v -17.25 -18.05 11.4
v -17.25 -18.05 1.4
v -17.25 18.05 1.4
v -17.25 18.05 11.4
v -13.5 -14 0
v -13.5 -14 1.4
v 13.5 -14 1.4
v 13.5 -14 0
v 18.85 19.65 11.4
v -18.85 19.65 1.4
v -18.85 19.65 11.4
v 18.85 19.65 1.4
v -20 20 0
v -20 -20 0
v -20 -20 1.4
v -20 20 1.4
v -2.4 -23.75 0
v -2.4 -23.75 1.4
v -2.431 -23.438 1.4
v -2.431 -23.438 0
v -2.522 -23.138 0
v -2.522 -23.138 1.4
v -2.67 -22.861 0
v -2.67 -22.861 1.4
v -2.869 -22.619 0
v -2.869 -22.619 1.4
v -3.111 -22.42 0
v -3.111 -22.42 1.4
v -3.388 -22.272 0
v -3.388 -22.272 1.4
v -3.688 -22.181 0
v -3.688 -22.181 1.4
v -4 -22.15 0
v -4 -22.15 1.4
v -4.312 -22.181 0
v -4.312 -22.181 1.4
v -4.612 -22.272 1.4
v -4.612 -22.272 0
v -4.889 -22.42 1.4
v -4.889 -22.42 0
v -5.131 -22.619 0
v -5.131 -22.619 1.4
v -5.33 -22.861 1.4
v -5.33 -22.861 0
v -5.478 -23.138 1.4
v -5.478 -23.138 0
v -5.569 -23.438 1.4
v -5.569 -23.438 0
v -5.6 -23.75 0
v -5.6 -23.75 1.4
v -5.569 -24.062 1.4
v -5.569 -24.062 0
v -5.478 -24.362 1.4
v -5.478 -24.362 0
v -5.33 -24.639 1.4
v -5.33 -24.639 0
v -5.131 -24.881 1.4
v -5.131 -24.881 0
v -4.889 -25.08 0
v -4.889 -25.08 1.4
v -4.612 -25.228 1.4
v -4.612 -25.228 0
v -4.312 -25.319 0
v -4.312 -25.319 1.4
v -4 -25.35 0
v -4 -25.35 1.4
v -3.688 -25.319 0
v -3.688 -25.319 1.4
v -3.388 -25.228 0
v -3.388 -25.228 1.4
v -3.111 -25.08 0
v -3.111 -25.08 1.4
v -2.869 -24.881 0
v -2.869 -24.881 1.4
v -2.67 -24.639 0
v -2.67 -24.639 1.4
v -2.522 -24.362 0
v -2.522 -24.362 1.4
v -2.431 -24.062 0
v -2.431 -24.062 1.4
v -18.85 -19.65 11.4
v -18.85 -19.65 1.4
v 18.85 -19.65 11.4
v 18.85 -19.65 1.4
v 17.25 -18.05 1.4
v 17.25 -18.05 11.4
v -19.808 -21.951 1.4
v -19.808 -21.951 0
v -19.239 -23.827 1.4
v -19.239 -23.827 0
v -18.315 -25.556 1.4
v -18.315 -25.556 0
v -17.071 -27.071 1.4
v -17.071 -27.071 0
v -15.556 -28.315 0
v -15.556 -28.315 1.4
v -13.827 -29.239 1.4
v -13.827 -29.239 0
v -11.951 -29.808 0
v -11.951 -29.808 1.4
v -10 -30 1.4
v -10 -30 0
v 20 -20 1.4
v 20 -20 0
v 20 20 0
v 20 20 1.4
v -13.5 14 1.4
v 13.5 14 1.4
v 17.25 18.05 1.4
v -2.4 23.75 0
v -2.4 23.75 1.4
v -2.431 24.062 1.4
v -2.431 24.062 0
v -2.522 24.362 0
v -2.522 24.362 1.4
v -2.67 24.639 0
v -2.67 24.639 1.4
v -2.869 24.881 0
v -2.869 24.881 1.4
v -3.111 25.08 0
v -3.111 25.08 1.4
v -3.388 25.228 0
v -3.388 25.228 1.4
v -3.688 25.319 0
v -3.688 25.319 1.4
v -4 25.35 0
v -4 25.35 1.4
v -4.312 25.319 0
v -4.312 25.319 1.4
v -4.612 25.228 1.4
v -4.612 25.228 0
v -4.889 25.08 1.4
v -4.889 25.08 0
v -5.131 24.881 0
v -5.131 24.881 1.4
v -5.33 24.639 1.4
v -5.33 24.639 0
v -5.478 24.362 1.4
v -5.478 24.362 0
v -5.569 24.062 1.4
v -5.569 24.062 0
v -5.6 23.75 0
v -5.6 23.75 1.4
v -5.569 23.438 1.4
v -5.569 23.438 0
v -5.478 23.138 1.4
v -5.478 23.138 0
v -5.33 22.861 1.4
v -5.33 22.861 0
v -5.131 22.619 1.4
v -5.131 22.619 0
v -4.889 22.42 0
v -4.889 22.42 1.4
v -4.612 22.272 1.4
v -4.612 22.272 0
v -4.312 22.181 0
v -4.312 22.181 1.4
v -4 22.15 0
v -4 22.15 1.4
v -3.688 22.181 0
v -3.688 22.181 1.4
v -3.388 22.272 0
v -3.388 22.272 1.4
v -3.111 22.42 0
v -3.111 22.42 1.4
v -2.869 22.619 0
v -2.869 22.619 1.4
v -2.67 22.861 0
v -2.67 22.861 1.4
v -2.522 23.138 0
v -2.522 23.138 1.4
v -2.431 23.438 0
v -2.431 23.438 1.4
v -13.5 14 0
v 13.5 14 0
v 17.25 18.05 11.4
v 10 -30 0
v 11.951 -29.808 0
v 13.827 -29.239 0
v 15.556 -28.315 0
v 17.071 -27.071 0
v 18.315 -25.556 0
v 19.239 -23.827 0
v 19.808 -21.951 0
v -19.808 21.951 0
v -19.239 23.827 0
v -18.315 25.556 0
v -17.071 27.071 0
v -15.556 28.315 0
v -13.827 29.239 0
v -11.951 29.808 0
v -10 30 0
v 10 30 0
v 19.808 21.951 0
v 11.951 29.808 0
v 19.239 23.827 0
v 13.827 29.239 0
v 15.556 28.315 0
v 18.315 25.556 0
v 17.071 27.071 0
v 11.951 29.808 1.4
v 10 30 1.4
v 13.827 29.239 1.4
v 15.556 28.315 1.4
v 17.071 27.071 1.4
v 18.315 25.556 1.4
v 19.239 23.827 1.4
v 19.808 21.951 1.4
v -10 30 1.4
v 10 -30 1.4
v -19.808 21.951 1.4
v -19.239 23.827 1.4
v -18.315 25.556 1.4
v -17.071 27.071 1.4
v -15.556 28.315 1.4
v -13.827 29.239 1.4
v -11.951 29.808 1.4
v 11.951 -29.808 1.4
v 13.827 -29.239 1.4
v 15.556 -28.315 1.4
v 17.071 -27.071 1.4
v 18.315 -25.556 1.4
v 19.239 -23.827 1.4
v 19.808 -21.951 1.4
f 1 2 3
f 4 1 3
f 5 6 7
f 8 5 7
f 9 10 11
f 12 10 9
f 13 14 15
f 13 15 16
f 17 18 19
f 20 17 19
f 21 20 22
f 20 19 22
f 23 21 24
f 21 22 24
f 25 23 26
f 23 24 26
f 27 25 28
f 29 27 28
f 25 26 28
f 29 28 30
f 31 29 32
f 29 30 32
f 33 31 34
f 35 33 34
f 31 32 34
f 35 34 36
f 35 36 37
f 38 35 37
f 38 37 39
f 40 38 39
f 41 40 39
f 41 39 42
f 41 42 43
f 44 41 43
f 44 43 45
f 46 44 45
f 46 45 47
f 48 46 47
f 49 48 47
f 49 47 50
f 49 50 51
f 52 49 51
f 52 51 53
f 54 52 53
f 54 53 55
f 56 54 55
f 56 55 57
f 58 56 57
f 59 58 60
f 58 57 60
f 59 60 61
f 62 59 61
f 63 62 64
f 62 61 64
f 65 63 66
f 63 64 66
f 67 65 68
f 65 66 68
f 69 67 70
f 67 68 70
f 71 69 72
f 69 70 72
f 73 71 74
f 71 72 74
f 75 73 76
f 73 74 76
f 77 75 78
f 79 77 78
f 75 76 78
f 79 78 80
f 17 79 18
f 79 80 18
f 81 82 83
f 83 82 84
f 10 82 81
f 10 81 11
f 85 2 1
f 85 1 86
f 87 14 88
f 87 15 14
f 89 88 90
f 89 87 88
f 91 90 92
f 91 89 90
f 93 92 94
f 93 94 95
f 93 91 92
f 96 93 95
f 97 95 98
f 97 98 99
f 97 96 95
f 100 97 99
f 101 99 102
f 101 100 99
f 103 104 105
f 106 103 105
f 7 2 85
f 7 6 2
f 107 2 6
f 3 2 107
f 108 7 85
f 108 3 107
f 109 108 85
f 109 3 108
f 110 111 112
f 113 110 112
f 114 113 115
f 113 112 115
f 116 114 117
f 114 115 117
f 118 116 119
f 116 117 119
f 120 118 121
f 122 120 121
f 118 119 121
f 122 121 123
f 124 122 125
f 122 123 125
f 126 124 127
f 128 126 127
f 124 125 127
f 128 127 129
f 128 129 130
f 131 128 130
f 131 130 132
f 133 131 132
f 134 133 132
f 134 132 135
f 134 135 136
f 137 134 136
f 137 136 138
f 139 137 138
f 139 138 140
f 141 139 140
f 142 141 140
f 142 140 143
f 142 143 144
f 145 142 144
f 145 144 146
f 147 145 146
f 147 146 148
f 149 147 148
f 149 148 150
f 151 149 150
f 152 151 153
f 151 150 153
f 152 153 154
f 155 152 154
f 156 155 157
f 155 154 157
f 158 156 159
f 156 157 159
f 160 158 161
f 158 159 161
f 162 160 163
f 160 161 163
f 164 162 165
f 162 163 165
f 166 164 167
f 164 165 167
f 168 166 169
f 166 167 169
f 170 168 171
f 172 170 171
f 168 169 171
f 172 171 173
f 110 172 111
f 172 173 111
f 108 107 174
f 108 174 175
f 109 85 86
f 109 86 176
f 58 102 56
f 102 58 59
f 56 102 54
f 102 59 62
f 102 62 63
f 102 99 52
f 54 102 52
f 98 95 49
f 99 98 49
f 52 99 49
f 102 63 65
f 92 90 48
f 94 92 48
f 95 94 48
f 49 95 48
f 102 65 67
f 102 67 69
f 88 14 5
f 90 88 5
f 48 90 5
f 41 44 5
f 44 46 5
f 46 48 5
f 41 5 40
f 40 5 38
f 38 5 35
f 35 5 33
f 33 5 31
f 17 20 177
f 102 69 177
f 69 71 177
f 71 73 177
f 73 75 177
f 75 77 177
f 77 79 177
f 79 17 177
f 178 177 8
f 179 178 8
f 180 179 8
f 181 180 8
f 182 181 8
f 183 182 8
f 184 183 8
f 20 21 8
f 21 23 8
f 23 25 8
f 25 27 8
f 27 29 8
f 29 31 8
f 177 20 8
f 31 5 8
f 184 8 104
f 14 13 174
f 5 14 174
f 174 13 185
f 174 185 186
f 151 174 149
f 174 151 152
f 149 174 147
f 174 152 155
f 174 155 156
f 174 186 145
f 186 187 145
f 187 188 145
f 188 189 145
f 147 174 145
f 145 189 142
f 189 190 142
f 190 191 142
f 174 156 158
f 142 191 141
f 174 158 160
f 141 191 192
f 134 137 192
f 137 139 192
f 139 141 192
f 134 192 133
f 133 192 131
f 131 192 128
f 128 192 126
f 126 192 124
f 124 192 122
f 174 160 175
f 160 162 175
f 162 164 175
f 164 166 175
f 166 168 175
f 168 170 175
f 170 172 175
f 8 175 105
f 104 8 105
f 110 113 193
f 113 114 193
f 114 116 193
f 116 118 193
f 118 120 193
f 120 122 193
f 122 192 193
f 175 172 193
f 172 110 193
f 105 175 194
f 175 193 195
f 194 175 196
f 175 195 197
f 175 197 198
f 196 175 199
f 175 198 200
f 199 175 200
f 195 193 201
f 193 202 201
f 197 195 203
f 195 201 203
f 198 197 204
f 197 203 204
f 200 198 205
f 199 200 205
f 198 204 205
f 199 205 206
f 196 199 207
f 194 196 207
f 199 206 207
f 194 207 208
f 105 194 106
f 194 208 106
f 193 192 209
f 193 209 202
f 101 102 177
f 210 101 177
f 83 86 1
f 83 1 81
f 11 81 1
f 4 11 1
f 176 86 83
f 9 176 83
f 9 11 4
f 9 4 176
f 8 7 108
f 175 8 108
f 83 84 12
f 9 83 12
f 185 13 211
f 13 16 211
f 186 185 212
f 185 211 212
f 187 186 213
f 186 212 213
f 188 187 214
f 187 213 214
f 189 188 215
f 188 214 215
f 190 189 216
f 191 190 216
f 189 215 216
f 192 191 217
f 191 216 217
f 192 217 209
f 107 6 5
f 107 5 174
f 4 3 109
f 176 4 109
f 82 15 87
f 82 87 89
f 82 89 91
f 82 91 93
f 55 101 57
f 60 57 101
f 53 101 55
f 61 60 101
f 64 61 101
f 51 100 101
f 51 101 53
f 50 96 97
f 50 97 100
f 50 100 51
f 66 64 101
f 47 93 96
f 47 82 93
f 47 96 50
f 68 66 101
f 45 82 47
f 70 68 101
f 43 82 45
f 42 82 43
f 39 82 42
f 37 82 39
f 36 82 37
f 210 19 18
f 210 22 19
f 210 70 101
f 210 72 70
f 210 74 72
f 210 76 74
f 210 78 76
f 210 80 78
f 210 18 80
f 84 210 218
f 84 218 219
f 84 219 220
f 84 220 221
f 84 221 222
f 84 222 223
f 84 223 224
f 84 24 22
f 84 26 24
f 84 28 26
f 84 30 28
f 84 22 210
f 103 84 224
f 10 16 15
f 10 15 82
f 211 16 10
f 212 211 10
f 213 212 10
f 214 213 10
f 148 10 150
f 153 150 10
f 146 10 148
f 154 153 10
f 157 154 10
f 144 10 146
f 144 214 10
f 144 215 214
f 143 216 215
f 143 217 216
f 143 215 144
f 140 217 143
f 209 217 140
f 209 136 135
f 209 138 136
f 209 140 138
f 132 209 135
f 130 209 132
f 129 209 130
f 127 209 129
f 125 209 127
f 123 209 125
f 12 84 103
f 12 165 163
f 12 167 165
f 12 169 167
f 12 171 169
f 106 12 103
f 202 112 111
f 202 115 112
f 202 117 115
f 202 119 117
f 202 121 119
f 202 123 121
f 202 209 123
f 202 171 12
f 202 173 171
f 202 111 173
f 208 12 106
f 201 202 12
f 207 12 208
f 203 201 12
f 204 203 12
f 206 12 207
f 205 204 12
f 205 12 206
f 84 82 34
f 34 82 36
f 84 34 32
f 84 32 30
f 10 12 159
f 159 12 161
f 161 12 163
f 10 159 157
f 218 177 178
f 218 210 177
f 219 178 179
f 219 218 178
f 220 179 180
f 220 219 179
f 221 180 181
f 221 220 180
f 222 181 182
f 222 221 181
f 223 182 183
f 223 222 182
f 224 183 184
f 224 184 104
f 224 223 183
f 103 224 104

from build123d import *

# Parameters (mm, degrees)
F0_W     = 40
F0_H     = 60
F1_DEPTH = 1.4
F2_W     = 37.7
F2_H     = 39.3
F2_W_2   = 34.5
F2_H_2   = 36.1
F3_DEPTH = 10
F4_R     = 1.6
F4_W     = 27
F4_H     = 28
F5_DEPTH = 1.401
F6_R     = 10


with BuildPart() as f1:
    # F0 (on Top) → F1 (new body)
    with BuildSketch(Plane.XY):
        Rectangle(F0_W, F0_H)
    extrude(amount=F1_DEPTH)

    # F2 (on face) → F3 (join)
    with BuildSketch(Plane.XY.offset(1.4)):
        Rectangle(F2_W, F2_H)
        Rectangle(F2_W_2, F2_H_2, mode=Mode.SUBTRACT)
    extrude(amount=F3_DEPTH)

    # F4 (on face) → F5 (cut, through all)
    with BuildSketch(Plane.XY.offset(1.4)):
        with Locations((-4, 23.75)):
            Circle(F4_R)
        with Locations((-4, -23.75)):
            Circle(F4_R)
        Rectangle(F4_W, F4_H)
    extrude(amount=-F5_DEPTH, mode=Mode.SUBTRACT)

    # F6
    f6_edges = [f1.edges().sort_by_distance(p)[0] for p in [
        (-20, -30, 0.7),
        (20, -30, 0.7),
        (20, 30, 0.7),
        (-20, 30, 0.7),
    ]]
    fillet(f6_edges, radius=F6_R)


solid = f1.part
